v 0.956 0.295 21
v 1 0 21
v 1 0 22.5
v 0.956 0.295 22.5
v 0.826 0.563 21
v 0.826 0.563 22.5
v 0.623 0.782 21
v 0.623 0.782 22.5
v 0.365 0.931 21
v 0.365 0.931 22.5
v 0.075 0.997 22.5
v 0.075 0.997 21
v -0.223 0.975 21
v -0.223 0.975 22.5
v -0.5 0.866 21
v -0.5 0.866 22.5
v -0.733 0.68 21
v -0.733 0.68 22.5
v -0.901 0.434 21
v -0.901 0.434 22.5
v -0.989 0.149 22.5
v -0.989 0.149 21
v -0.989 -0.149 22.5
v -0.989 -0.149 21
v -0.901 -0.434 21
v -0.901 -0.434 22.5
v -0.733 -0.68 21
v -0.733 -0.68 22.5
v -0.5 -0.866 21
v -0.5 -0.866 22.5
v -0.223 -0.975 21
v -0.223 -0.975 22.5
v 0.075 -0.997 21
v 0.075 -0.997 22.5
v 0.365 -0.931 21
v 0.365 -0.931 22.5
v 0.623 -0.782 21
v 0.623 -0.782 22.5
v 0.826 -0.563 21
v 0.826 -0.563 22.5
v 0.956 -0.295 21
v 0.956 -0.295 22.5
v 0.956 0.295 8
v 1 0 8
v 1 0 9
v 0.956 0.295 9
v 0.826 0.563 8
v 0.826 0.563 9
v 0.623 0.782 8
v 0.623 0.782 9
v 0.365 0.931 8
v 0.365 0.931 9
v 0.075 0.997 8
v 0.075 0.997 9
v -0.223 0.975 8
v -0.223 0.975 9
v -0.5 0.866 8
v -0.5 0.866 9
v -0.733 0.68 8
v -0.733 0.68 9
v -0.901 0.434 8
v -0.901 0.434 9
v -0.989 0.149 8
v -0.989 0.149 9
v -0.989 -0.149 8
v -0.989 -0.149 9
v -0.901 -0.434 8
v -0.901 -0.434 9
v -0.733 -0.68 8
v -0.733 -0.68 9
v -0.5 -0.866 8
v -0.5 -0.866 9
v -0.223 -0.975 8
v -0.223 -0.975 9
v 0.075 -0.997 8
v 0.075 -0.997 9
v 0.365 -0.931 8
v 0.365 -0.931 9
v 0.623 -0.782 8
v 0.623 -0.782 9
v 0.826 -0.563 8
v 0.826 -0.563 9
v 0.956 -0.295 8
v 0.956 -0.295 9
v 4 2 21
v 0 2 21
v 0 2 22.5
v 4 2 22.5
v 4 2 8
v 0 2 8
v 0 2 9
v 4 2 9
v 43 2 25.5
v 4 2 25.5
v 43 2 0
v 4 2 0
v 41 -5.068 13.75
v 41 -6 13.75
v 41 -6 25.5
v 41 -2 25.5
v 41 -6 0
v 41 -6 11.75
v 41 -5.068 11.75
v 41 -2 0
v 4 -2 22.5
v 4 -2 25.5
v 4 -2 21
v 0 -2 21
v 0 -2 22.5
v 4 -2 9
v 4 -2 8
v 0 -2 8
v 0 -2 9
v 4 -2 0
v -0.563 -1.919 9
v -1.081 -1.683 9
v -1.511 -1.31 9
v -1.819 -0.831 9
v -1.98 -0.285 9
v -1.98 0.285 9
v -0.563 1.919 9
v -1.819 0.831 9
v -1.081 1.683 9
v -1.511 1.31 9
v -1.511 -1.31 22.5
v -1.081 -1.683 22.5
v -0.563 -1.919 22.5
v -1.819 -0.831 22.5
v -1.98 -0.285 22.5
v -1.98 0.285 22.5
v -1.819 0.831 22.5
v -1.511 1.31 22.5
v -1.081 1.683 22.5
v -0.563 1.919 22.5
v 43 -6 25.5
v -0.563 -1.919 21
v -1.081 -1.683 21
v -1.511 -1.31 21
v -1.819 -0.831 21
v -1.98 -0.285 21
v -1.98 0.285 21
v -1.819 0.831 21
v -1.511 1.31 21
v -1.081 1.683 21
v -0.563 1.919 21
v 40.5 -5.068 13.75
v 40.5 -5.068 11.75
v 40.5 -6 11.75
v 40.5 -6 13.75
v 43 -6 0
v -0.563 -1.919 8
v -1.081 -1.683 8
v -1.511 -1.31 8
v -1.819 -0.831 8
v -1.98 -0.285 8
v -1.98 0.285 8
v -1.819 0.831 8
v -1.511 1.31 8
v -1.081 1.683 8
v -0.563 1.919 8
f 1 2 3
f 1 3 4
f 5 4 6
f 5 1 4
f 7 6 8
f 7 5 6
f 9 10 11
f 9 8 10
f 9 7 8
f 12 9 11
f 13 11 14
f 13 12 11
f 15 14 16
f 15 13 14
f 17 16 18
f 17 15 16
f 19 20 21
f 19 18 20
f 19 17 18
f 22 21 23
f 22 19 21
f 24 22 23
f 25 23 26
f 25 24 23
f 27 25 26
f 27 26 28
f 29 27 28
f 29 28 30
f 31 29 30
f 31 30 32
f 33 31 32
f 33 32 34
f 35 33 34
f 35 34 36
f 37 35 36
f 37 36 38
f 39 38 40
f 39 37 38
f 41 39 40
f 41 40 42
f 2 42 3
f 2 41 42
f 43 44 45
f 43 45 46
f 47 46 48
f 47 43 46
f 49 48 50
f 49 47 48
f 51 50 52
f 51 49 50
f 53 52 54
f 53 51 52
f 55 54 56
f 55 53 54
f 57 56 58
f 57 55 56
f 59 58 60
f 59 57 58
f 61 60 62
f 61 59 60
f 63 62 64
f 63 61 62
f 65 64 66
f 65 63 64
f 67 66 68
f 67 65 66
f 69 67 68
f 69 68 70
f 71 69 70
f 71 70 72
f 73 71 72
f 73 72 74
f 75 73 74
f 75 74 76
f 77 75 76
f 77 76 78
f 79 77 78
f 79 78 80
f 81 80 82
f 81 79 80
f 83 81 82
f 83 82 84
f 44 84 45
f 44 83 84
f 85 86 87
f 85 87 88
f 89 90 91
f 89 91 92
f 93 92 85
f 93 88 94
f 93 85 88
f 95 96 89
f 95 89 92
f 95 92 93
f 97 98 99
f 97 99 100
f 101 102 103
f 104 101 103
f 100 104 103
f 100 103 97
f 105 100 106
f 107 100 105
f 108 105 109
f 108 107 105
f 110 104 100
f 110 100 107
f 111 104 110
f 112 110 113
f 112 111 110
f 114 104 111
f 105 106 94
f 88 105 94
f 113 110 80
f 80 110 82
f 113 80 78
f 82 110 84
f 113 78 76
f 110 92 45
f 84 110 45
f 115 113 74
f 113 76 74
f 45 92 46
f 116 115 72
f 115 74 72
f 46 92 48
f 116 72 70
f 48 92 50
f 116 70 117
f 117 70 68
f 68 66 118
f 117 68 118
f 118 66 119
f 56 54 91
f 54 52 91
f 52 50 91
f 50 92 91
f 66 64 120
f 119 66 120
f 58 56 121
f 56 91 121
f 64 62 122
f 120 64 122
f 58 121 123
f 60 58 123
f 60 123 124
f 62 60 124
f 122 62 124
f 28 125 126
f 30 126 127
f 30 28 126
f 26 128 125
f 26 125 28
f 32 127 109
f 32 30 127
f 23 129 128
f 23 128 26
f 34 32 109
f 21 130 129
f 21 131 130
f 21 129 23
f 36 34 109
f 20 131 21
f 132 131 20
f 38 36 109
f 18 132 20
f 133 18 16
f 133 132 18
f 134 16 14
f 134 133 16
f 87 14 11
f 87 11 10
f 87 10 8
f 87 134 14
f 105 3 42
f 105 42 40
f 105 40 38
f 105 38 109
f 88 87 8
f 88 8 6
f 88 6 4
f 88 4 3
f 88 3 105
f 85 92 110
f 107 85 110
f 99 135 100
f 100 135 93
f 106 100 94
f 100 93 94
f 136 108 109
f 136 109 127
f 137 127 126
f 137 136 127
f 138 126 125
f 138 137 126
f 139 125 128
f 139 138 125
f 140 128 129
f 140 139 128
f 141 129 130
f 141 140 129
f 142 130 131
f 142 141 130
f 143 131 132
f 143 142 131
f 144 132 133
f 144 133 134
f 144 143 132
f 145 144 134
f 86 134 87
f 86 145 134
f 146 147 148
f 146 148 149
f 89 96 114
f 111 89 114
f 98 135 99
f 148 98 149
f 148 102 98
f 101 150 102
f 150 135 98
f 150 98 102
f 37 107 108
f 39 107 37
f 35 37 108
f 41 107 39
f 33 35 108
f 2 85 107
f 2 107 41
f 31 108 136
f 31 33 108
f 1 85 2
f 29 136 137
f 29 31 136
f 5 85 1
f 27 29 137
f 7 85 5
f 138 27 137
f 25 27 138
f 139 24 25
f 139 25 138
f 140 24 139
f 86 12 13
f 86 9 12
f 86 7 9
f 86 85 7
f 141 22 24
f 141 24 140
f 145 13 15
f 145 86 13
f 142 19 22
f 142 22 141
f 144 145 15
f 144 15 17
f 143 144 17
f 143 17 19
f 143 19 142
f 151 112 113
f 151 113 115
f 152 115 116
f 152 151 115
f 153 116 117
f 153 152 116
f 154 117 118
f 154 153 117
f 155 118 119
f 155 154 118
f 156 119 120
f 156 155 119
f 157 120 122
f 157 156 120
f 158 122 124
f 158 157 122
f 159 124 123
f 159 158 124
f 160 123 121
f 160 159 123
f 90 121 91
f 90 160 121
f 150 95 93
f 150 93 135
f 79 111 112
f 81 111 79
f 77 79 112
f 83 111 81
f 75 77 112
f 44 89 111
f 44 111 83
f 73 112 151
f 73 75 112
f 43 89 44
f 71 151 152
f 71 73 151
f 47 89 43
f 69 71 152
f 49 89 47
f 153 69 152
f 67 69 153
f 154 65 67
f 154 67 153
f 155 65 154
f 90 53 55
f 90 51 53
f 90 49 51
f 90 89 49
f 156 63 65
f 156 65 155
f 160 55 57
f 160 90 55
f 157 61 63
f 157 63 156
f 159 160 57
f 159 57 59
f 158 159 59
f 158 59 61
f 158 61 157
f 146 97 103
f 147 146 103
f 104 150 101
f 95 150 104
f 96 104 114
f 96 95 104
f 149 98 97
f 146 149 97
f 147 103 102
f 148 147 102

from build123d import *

# Parameters (mm, degrees)
SKETCH_1_R          = 1
EXTRUDE_1_DEPTH     = 25.5
SKETCH_2_W          = 8
SKETCH_2_H          = 4
CUT_EXTRUDE_2_DEPTH = 3
CUT_EXTRUDE_3_DEPTH = 8
CUT_EXTRUDE_START   = -9
CUT_EXTRUDE_4_DEPTH = 12
EXTRUDE_2_DEPTH     = 0.5


with BuildPart() as part:
    # 草图1 → 凸台-拉伸1 (new body)
    with BuildSketch(Plane.XY):
        with BuildLine():
            Line((0, 2), (43, 2))
            Line((43, 2), (43, -6))
            Line((43, -6), (41, -6))
            Line((41, -6), (41, -2))
            Line((41, -2), (0, -2))
            ThreePointArc((0, -2), (-2, 0), (0, 2))
        make_face()
        Circle(SKETCH_1_R, mode=Mode.SUBTRACT)
    extrude(amount=EXTRUDE_1_DEPTH)

    # 草图2 → 切除-拉伸2 (cut)
    with BuildSketch(Plane.XY.offset(25.5)):
        Rectangle(SKETCH_2_W, SKETCH_2_H)
    extrude(amount=-CUT_EXTRUDE_2_DEPTH, mode=Mode.SUBTRACT)

    # 草图3 → 切除-拉伸3 (cut)
    with BuildSketch(Plane(origin=(0, 0, 0), x_dir=(-1, 0, 0), z_dir=(0, 0, -1))):
        with BuildLine():
            Line((0, 2), (-4, 2))
            Line((-4, 2), (-4, -2))
            Line((-4, -2), (0, -2))
            ThreePointArc((0, -2), (2, 0), (0, 2))
        make_face()
    extrude(amount=-CUT_EXTRUDE_3_DEPTH, mode=Mode.SUBTRACT)

    # 草图3<2> → 切除-拉伸4 (cut)
    with BuildSketch(Plane(origin=(0, 0, 0), x_dir=(-1, 0, 0), z_dir=(0, 0, -1)).offset(CUT_EXTRUDE_START)):
        with BuildLine():
            ThreePointArc((0, -2), (2, 0), (0, 2))
            Line((0, 2), (-4, 2))
            Line((-4, 2), (-4, -2))
            Line((-4, -2), (0, -2))
        make_face()
    extrude(amount=-CUT_EXTRUDE_4_DEPTH, mode=Mode.SUBTRACT)

    # 草图4 → 凸台-拉伸2 (add)
    with BuildSketch(Plane.ZY.offset(-41)):
        Polygon((13.75, -5.068409561), (11.75, -5.068409561), (11.75, -6), (12.75, -6), (13.75, -6), align=None)
    extrude(amount=EXTRUDE_2_DEPTH)


solid = part.part
